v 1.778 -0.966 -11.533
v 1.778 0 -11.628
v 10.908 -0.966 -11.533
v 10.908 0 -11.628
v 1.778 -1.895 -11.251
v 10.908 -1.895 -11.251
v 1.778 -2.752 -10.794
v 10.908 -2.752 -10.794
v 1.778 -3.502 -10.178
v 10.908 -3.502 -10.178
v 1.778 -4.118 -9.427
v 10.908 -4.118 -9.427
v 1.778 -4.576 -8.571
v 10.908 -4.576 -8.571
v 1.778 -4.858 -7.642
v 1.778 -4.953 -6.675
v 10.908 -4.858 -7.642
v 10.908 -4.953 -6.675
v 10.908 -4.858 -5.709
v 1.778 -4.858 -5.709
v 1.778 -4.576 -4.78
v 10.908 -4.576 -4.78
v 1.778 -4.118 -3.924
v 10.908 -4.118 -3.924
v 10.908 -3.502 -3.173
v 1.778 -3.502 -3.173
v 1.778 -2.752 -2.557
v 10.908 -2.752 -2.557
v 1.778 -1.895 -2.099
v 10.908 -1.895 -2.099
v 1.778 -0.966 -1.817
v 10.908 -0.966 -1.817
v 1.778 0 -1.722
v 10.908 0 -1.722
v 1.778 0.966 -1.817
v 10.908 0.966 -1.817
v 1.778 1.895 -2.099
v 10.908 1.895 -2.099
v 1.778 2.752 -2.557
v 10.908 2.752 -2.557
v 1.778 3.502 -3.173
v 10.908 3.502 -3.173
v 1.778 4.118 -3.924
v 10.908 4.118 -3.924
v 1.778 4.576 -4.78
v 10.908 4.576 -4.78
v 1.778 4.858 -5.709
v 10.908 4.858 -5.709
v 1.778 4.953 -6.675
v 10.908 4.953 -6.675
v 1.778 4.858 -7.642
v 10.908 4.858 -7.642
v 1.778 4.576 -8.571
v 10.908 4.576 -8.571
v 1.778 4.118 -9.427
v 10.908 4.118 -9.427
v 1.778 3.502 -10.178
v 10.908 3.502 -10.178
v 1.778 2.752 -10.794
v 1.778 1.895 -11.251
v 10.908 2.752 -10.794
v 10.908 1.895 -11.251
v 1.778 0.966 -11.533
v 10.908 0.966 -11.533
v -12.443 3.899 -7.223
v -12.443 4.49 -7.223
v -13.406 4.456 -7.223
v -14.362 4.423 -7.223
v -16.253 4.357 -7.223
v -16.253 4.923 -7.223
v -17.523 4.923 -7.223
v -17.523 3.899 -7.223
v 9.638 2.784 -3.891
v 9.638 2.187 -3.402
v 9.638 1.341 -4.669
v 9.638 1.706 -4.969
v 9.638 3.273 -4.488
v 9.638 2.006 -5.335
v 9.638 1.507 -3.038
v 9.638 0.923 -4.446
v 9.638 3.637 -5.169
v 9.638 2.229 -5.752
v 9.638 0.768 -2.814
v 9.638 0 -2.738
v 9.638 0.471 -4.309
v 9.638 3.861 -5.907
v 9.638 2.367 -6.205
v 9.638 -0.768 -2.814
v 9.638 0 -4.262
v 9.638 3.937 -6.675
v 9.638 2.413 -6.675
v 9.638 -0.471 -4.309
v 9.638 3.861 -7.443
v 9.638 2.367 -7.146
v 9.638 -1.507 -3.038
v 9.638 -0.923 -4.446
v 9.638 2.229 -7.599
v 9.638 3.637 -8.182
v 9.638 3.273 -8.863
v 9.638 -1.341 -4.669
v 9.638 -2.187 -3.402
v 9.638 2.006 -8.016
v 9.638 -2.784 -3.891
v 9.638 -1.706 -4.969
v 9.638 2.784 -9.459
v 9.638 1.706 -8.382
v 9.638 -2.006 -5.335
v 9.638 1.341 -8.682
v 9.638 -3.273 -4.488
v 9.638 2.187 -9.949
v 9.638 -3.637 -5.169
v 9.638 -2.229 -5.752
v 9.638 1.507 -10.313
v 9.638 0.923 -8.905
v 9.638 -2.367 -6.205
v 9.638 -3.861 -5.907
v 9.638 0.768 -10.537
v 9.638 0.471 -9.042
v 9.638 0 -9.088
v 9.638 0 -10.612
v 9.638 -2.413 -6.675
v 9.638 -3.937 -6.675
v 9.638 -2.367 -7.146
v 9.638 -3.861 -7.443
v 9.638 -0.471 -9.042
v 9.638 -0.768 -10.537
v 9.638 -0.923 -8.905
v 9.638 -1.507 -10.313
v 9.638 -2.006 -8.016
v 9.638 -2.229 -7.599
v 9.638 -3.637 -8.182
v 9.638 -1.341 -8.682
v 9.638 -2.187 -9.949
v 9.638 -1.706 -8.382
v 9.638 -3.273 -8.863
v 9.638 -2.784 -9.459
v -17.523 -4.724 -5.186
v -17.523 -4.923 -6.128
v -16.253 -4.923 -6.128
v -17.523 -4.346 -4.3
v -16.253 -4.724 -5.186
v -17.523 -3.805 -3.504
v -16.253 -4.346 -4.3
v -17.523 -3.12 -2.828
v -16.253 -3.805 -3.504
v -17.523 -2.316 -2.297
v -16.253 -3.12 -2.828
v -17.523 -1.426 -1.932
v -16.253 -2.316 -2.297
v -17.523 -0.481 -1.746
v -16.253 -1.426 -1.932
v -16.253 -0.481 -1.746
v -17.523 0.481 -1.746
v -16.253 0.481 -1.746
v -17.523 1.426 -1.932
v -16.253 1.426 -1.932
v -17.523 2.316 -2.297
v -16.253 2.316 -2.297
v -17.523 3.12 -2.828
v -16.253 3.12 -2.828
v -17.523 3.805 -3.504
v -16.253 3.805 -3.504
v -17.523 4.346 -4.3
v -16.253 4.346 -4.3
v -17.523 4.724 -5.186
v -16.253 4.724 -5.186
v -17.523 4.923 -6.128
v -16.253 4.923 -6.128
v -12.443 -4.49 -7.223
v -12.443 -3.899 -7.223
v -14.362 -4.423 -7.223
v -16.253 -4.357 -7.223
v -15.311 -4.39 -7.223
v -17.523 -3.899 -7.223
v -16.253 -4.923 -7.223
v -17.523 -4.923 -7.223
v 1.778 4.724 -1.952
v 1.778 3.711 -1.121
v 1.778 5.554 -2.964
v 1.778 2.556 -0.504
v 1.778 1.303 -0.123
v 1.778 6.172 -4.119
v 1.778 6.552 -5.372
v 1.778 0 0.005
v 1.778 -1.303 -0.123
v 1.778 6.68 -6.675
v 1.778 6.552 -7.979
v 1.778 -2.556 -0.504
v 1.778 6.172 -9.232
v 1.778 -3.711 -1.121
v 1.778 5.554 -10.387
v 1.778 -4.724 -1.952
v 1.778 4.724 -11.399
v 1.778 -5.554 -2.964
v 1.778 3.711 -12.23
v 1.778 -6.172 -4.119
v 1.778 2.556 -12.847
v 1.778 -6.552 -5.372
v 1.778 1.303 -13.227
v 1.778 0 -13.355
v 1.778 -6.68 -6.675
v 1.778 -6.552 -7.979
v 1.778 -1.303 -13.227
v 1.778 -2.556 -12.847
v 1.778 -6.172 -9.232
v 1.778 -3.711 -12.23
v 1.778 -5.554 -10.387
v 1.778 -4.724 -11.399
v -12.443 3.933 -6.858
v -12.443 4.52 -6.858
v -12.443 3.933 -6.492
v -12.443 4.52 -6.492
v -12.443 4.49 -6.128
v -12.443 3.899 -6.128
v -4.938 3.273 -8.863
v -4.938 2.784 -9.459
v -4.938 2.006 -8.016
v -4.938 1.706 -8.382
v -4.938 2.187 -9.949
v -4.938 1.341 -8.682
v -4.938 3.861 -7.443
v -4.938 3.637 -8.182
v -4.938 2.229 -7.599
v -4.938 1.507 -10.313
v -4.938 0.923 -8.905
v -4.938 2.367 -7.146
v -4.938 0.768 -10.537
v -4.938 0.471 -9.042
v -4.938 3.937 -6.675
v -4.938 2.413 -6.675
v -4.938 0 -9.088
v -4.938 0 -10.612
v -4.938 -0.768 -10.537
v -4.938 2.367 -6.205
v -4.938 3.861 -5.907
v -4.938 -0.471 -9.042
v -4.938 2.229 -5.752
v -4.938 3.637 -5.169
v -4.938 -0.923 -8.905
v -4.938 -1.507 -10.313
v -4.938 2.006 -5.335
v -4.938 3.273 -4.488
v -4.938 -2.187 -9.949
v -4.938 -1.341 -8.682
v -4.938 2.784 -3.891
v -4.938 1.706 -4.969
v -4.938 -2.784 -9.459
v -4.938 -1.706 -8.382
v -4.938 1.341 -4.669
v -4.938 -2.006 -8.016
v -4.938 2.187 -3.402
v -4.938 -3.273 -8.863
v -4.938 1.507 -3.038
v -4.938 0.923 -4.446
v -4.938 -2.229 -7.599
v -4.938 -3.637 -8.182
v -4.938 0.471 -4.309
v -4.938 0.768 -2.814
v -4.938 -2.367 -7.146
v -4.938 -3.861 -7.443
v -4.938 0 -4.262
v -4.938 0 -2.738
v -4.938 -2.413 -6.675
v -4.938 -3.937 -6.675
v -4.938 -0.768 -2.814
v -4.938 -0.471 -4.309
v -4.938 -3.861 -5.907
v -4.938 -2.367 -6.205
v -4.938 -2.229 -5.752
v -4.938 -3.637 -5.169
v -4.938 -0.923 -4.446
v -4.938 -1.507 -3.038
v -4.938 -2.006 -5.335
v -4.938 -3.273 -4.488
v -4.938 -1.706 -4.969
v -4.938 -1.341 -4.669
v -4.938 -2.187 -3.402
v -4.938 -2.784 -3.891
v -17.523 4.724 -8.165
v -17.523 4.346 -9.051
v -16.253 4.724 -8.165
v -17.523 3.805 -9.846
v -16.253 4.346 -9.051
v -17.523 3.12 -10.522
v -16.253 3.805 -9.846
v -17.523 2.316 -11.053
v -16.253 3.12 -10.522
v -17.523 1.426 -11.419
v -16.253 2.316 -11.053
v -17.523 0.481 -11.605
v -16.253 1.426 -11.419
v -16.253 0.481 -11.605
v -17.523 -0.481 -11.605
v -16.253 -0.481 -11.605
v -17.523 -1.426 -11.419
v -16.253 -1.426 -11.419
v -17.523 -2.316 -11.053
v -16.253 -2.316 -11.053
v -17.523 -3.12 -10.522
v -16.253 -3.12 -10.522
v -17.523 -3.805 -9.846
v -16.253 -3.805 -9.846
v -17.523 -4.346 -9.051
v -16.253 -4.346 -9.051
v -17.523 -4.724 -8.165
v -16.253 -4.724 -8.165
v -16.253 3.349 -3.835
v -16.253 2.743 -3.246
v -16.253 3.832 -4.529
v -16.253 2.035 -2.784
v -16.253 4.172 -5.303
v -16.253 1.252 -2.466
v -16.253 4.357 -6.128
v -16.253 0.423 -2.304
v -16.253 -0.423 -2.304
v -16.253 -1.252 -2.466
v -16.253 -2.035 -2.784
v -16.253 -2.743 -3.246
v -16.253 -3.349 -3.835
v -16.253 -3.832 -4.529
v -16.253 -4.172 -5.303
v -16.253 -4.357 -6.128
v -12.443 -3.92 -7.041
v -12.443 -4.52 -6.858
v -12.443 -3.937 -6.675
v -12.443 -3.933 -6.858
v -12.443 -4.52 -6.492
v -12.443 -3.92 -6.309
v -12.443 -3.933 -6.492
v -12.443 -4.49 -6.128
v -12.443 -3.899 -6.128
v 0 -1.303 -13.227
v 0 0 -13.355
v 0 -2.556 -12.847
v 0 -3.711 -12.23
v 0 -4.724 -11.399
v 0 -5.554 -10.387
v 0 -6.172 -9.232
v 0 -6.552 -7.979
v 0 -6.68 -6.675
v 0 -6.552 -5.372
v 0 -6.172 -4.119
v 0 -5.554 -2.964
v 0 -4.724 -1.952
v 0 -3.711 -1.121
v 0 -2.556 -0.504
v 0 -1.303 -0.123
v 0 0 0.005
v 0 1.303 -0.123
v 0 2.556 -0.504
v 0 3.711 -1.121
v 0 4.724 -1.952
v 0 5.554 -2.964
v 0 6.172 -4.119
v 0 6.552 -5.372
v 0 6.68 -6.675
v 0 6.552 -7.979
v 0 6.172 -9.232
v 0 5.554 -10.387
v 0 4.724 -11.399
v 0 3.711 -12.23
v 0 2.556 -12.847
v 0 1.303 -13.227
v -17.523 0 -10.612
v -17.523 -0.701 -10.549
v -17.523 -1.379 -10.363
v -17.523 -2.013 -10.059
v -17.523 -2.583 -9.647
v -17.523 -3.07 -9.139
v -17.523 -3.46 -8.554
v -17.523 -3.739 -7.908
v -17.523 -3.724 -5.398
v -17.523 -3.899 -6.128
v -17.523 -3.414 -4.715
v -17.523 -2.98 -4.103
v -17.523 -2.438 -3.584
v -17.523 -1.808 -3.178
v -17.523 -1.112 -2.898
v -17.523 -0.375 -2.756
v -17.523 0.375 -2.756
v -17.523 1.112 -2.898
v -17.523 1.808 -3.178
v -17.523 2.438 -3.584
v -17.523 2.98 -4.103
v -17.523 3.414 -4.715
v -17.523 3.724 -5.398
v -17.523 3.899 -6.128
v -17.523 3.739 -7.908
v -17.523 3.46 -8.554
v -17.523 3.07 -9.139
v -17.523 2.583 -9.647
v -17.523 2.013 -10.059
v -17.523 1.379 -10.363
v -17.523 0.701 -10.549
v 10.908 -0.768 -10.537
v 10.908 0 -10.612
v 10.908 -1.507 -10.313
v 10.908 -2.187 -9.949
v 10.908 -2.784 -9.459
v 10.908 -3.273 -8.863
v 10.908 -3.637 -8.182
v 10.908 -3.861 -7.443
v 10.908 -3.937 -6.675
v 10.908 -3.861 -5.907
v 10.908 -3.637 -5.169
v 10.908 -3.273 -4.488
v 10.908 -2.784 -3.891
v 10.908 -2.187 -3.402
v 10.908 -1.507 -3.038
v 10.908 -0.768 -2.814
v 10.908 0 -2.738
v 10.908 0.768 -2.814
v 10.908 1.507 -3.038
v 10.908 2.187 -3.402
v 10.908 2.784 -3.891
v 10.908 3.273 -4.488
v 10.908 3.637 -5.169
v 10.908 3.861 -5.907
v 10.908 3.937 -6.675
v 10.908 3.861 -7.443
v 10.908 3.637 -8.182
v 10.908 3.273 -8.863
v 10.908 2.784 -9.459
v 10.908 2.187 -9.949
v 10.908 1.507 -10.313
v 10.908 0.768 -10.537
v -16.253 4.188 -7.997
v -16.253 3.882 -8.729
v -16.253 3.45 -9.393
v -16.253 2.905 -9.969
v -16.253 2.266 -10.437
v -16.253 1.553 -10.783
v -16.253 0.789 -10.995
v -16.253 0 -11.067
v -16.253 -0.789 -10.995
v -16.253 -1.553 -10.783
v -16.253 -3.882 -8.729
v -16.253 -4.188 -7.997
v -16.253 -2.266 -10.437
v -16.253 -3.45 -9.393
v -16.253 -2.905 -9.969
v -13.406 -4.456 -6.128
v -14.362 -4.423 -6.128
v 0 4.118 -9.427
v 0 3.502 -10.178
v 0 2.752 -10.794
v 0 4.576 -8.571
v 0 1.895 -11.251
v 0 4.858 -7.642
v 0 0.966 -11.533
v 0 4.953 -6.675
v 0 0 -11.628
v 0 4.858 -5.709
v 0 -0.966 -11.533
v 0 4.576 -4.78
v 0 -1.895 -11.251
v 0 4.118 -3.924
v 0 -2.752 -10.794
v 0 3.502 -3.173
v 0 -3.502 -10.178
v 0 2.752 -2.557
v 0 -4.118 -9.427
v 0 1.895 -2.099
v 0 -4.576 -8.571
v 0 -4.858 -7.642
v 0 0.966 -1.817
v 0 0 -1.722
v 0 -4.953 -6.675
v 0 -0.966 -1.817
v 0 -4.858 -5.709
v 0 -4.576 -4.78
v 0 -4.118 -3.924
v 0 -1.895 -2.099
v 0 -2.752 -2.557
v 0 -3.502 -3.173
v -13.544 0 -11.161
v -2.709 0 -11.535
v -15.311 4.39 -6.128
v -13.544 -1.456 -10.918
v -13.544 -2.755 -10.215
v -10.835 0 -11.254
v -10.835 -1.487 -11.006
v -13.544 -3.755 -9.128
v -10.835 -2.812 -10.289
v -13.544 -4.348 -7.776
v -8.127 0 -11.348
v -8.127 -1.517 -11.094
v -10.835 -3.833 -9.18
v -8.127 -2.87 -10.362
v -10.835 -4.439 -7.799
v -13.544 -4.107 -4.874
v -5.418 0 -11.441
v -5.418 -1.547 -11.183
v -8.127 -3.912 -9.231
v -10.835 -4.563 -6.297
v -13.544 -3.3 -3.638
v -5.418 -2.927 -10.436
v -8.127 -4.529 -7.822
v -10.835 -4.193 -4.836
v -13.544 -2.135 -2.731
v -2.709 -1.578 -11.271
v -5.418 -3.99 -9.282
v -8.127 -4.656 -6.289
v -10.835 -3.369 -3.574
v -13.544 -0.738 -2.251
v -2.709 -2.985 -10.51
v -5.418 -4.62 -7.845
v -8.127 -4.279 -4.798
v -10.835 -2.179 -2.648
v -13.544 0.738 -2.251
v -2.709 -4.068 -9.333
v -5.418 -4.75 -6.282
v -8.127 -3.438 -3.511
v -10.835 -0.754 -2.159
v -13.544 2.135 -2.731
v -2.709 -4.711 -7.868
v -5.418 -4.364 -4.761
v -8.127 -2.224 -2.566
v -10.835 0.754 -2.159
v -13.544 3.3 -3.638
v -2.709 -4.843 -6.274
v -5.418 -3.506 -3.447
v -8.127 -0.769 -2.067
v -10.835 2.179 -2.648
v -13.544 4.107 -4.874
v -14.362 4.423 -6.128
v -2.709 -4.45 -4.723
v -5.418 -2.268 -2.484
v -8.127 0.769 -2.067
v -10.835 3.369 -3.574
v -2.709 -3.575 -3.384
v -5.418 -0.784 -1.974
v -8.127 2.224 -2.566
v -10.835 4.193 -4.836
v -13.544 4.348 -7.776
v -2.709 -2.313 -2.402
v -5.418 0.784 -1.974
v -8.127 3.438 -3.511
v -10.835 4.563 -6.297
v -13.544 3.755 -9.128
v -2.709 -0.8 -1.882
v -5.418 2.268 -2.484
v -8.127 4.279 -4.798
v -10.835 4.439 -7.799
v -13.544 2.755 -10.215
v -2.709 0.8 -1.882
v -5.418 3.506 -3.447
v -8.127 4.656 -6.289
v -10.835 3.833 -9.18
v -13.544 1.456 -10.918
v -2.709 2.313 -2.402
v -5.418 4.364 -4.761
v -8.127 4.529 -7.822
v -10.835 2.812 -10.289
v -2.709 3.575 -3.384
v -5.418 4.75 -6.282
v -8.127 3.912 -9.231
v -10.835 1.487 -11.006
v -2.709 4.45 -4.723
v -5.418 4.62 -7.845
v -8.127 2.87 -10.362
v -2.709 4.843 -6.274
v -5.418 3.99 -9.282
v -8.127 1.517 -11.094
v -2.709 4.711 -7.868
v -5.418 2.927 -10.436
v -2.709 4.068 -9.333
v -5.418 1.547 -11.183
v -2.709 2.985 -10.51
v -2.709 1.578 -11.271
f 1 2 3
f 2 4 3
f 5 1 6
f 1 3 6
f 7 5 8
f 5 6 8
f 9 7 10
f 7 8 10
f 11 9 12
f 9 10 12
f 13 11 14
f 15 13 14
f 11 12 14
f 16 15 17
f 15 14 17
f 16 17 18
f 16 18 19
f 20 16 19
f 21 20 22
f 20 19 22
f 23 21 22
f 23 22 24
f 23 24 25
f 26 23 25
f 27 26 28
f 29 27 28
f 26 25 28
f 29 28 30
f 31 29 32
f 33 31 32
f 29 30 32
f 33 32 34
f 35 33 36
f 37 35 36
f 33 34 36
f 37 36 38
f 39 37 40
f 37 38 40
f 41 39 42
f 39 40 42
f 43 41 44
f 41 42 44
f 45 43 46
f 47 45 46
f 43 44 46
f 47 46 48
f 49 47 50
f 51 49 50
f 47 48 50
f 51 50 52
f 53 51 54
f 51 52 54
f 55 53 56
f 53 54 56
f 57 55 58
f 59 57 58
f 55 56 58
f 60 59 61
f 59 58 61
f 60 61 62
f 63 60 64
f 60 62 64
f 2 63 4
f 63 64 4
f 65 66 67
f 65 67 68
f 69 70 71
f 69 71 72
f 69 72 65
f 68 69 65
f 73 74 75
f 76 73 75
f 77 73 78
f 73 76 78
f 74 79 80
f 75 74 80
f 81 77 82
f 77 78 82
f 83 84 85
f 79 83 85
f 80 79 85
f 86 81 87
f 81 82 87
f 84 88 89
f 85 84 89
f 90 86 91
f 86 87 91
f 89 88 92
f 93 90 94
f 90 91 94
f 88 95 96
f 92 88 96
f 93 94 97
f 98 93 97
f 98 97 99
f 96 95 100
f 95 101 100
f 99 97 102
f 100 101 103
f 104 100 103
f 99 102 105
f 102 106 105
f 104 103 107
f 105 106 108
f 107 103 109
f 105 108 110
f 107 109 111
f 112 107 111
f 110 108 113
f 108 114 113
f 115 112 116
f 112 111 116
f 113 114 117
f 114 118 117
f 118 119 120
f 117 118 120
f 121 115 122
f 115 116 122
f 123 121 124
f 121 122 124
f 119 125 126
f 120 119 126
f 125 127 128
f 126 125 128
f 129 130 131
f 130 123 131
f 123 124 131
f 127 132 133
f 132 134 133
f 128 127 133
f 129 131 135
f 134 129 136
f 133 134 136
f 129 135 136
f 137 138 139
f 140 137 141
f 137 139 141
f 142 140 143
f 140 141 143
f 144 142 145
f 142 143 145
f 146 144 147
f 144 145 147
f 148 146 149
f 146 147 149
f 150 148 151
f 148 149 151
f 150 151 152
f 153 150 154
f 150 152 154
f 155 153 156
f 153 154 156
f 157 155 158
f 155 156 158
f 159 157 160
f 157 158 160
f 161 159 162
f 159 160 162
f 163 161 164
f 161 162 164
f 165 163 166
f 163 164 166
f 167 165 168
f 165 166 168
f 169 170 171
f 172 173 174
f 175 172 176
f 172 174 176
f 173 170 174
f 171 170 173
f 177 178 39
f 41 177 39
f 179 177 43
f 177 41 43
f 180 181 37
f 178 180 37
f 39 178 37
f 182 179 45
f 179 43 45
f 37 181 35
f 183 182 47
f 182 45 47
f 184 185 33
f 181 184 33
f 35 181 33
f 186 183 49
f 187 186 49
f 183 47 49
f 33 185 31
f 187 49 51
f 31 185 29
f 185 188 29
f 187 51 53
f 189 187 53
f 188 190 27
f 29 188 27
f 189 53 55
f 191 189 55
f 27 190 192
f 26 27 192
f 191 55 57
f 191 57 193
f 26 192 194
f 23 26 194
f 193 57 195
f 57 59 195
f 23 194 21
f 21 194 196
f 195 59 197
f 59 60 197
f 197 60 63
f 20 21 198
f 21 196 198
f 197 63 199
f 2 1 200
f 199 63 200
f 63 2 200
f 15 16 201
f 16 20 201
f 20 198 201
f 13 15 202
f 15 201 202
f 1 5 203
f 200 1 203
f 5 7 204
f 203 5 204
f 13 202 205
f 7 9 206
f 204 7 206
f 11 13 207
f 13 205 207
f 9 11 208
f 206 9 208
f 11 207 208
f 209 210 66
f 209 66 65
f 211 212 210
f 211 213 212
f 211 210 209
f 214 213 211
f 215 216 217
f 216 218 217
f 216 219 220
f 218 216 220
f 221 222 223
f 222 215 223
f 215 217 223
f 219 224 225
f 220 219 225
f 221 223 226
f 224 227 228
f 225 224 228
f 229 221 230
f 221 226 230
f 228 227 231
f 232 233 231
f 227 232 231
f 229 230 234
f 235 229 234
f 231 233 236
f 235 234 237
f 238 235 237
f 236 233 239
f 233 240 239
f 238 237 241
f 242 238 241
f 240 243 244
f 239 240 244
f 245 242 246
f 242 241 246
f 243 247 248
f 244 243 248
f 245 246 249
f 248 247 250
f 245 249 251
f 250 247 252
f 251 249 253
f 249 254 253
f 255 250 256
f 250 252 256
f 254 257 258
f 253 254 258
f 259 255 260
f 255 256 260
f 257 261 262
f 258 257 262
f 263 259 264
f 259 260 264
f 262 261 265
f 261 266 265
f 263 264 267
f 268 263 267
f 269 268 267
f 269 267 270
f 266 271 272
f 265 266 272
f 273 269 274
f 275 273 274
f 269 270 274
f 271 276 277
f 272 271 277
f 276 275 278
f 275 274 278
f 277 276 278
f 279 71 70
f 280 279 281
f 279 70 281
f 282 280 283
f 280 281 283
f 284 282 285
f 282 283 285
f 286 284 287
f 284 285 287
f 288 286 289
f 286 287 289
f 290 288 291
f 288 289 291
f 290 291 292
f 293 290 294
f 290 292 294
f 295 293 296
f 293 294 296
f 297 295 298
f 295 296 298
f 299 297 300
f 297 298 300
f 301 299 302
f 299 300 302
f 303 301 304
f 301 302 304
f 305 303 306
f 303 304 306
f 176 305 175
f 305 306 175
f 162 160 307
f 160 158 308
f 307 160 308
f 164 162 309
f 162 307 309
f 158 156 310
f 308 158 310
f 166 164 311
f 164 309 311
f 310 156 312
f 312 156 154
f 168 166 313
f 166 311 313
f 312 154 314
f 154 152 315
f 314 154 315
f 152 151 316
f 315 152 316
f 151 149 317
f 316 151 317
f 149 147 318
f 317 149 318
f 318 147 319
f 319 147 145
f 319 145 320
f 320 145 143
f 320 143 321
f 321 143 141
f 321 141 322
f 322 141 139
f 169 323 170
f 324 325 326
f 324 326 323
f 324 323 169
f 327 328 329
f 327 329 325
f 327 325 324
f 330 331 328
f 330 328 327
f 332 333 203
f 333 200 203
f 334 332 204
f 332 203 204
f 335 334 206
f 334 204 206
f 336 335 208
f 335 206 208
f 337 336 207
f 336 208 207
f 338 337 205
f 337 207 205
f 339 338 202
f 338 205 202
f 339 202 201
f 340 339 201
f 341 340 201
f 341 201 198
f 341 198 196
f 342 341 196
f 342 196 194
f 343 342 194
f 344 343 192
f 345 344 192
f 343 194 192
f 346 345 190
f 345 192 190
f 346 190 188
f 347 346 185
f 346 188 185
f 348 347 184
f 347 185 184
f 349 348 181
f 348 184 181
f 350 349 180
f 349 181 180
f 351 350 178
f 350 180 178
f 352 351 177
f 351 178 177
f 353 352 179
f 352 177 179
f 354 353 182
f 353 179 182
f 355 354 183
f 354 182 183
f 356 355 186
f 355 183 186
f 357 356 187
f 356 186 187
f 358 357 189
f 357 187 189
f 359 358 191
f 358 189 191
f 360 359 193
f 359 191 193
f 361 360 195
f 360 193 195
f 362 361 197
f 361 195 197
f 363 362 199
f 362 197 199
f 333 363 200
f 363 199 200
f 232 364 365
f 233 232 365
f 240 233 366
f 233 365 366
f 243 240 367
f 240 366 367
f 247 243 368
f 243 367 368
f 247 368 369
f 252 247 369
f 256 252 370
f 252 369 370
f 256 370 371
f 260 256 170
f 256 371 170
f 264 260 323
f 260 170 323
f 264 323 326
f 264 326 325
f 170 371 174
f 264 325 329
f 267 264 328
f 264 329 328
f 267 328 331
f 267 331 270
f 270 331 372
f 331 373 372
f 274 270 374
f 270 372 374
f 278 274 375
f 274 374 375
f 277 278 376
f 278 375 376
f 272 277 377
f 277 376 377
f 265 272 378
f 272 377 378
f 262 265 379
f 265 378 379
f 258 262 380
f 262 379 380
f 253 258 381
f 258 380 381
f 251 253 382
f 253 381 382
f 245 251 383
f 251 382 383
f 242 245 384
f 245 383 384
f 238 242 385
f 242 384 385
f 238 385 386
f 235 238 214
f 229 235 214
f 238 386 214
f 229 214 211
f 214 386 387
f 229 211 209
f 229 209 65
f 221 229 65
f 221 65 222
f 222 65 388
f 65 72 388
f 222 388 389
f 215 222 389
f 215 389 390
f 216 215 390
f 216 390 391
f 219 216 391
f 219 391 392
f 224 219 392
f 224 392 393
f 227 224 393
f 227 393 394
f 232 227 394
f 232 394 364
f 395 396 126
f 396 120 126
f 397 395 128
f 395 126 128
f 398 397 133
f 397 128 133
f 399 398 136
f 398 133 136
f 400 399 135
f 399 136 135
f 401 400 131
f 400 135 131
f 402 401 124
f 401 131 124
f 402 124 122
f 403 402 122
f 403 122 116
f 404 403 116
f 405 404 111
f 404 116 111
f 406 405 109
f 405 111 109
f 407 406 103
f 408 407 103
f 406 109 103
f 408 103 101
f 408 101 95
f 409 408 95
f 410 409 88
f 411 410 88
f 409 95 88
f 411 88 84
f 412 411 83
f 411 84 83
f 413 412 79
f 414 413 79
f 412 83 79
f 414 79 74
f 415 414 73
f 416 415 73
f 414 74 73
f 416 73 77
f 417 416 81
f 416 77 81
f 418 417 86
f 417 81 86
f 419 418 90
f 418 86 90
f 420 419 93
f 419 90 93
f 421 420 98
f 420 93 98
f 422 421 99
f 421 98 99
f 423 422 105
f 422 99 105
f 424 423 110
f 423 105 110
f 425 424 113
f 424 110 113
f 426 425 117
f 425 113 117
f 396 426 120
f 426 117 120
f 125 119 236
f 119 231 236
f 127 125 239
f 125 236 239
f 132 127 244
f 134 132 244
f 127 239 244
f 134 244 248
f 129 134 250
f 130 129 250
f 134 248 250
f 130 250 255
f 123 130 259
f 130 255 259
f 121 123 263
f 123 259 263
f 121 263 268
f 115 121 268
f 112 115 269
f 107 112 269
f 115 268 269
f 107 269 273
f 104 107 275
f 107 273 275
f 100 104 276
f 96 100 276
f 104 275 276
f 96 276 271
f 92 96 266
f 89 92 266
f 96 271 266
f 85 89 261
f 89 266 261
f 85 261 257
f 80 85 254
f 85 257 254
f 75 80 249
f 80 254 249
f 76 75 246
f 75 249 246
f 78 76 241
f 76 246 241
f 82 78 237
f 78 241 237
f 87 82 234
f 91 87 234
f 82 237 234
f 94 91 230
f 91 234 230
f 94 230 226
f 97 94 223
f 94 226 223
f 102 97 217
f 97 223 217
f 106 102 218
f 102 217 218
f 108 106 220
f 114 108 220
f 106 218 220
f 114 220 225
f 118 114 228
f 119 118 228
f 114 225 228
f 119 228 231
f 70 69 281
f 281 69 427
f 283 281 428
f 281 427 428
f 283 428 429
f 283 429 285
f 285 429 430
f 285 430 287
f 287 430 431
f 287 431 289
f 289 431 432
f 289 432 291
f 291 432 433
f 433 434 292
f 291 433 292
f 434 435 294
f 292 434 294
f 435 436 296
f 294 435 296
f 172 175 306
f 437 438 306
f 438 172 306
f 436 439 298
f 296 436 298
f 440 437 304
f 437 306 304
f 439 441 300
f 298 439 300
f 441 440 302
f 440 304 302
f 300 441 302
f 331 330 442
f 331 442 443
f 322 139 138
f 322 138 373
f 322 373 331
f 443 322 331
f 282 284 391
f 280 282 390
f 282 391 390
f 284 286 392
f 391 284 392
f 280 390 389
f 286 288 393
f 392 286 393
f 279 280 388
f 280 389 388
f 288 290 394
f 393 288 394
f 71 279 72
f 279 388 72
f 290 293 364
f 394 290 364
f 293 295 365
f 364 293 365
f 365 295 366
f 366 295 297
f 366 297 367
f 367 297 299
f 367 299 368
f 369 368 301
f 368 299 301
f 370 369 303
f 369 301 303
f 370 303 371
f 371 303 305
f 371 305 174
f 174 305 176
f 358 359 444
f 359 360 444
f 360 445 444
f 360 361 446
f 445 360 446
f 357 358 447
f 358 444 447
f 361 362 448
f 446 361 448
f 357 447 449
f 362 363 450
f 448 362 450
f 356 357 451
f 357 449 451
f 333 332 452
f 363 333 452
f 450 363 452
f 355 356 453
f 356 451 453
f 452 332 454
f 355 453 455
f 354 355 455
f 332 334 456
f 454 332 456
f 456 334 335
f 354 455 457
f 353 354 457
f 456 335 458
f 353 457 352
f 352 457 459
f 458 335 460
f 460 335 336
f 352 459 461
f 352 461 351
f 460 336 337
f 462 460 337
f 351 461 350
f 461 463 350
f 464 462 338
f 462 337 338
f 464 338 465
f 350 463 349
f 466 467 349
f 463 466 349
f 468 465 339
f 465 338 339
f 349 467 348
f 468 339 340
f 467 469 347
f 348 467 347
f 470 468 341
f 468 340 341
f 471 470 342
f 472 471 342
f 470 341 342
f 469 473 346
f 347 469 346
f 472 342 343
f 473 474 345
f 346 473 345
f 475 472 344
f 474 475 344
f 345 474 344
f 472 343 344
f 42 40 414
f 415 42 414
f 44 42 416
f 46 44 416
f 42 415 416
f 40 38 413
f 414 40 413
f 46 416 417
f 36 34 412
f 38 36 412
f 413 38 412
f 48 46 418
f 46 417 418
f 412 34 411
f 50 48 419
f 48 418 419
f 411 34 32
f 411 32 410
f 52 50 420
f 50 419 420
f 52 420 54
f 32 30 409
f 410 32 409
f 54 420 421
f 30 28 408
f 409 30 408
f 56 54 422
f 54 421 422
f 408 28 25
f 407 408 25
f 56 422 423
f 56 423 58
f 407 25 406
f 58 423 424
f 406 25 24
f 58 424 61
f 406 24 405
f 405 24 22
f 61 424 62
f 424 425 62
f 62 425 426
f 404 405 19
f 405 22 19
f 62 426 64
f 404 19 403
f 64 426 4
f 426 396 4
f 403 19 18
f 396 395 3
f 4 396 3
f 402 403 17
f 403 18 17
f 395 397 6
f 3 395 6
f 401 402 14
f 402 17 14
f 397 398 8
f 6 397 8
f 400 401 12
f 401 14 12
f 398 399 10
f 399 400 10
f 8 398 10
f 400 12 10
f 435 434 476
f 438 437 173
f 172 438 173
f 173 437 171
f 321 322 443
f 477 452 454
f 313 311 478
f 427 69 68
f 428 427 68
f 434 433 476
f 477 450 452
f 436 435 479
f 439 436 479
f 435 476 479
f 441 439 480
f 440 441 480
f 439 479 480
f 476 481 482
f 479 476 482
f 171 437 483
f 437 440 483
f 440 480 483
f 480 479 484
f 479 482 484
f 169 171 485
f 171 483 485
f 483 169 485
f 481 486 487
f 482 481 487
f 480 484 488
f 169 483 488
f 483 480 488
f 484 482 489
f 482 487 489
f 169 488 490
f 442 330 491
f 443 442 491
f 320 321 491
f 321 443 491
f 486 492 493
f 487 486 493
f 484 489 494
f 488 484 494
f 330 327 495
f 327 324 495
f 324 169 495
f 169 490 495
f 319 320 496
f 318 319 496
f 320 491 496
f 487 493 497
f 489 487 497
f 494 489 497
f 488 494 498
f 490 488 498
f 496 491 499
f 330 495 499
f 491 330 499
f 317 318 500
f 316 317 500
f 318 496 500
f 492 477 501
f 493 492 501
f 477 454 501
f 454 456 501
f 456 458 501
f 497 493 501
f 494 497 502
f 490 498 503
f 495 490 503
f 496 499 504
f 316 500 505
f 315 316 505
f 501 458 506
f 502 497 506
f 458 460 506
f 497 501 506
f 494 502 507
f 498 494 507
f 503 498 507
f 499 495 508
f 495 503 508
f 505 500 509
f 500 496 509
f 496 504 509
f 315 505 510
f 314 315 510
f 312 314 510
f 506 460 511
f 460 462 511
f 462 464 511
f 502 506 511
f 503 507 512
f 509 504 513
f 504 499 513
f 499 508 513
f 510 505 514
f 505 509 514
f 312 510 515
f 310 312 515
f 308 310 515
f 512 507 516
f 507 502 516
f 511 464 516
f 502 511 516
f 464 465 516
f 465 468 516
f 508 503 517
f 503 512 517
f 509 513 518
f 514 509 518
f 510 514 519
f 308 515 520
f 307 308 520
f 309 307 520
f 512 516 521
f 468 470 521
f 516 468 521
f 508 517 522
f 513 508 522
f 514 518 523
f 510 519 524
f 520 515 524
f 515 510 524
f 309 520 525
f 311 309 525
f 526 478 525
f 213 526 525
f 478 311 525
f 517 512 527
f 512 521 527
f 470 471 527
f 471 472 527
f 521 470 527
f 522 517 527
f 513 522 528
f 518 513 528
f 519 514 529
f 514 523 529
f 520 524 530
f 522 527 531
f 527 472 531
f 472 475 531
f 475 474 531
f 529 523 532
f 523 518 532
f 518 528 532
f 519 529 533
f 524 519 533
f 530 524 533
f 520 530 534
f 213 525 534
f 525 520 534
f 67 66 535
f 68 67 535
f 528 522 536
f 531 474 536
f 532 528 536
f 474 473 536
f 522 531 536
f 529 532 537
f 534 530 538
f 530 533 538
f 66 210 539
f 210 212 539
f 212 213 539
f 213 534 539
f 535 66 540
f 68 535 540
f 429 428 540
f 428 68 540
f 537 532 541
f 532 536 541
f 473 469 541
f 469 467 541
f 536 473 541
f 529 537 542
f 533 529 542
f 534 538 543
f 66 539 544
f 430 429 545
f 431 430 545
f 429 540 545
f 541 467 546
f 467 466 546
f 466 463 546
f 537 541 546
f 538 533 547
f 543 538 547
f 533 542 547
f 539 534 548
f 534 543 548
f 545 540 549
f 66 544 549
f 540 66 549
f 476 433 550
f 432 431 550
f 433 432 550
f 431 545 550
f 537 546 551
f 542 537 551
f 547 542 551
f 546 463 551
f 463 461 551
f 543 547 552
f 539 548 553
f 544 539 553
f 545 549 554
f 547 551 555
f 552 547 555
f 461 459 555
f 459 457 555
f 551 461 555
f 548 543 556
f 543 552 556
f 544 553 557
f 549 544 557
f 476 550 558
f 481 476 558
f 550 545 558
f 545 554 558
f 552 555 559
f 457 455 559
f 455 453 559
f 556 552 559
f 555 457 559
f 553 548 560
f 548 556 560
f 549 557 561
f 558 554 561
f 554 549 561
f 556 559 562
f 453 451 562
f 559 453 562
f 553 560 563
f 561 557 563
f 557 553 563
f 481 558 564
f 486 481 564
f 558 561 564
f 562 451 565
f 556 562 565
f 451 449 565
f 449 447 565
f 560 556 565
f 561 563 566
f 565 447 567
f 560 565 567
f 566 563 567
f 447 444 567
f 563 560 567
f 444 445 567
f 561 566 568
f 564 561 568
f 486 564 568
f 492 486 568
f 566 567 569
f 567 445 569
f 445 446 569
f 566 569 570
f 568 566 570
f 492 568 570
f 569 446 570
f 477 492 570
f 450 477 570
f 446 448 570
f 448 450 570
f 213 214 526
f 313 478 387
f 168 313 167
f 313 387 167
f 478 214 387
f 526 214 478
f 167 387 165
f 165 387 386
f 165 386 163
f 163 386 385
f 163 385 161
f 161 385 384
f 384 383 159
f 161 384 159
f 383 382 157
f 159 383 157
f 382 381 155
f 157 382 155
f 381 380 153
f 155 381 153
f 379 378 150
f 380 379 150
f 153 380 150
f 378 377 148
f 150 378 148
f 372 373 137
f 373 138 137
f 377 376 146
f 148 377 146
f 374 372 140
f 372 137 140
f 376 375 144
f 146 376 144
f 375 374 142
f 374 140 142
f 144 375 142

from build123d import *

# Parameters (mm, degrees)
F3_DEPTH = 5.08
F4_DEPTH = 25.4


with BuildPart() as f1:
    # F0 (on Front) → F1 (revolve)
    with BuildSketch(Plane.XZ):
        Polygon((9.6376508882, -9.0882862558), (1.2556508882, -9.0882862558), (1.2556508882, -6.6752862558), (0, -6.6752862558), (0, -9.0882862558), (-4.9383663572, -9.0882862558), (-4.9383663572, -10.6122862558), (-16.2532180548, -10.6122862558), (-17.5232180548, -10.6122862558), (-17.5232180548, -11.6282862558), (-16.2532180548, -11.6282862558), (-16.2532180548, -11.0669787973), (0, -11.6282862558), (0, -13.3554862558), (1.778, -13.3554862558), (1.778, -11.6282862558), (10.9076508882, -11.6282862558), (10.9076508882, -10.6122862558), (9.6376508882, -10.6122862558), align=None)
    revolve(axis=Axis((-3.3077835833, 0, -6.6752862558), (-1, 0, 0)))

    # F2 (on face) → F3 (cut)
    with BuildSketch(Plane(origin=(-17.5232180548, 0, 0), x_dir=(0, -1, 0), z_dir=(-1, 0, 0))):
        with BuildLine():
            Line((-3.8987080534, -6.1275230643), (-4.9226176457, -6.1275230643))
            ThreePointArc((-4.9226176457, -6.1275230643), (-4.953, -6.6752862558), (-4.9226176457, -7.2230494473))
            Line((-4.9226176457, -7.2230494473), (-3.8987080534, -7.2230494473))
            ThreePointArc((-3.8987080534, -7.2230494473), (-3.937, -6.6752862558), (-3.8987080534, -6.1275230643))
        make_face()
        with BuildLine():
            ThreePointArc((4.953, -6.6752862558), (4.9453985784, -6.400983685), (4.9226176457, -6.1275230643))
            Line((4.9226176457, -6.1275230643), (3.8987080534, -6.1275230643))
            ThreePointArc((3.8987080534, -6.1275230643), (3.9274153464, -6.4007362662), (3.937, -6.6752862558))
            ThreePointArc((3.937, -6.6752862558), (3.9274153464, -6.9498362454), (3.8987080534, -7.2230494473))
            Line((3.8987080534, -7.2230494473), (4.9226176457, -7.2230494473))
            ThreePointArc((4.9226176457, -7.2230494473), (4.9453985784, -6.9495888266), (4.953, -6.6752862558))
        make_face()
    extrude(amount=-F3_DEPTH, mode=Mode.SUBTRACT)

    # F4 (cut): a face of the model
    f4_faces = [f1.faces().sort_by_distance(p)[0] for p in [
        (1.2556508882, 0, -6.6752862558),
    ]]
    extrude(f4_faces, amount=-F4_DEPTH, mode=Mode.SUBTRACT)


solid = f1.part
